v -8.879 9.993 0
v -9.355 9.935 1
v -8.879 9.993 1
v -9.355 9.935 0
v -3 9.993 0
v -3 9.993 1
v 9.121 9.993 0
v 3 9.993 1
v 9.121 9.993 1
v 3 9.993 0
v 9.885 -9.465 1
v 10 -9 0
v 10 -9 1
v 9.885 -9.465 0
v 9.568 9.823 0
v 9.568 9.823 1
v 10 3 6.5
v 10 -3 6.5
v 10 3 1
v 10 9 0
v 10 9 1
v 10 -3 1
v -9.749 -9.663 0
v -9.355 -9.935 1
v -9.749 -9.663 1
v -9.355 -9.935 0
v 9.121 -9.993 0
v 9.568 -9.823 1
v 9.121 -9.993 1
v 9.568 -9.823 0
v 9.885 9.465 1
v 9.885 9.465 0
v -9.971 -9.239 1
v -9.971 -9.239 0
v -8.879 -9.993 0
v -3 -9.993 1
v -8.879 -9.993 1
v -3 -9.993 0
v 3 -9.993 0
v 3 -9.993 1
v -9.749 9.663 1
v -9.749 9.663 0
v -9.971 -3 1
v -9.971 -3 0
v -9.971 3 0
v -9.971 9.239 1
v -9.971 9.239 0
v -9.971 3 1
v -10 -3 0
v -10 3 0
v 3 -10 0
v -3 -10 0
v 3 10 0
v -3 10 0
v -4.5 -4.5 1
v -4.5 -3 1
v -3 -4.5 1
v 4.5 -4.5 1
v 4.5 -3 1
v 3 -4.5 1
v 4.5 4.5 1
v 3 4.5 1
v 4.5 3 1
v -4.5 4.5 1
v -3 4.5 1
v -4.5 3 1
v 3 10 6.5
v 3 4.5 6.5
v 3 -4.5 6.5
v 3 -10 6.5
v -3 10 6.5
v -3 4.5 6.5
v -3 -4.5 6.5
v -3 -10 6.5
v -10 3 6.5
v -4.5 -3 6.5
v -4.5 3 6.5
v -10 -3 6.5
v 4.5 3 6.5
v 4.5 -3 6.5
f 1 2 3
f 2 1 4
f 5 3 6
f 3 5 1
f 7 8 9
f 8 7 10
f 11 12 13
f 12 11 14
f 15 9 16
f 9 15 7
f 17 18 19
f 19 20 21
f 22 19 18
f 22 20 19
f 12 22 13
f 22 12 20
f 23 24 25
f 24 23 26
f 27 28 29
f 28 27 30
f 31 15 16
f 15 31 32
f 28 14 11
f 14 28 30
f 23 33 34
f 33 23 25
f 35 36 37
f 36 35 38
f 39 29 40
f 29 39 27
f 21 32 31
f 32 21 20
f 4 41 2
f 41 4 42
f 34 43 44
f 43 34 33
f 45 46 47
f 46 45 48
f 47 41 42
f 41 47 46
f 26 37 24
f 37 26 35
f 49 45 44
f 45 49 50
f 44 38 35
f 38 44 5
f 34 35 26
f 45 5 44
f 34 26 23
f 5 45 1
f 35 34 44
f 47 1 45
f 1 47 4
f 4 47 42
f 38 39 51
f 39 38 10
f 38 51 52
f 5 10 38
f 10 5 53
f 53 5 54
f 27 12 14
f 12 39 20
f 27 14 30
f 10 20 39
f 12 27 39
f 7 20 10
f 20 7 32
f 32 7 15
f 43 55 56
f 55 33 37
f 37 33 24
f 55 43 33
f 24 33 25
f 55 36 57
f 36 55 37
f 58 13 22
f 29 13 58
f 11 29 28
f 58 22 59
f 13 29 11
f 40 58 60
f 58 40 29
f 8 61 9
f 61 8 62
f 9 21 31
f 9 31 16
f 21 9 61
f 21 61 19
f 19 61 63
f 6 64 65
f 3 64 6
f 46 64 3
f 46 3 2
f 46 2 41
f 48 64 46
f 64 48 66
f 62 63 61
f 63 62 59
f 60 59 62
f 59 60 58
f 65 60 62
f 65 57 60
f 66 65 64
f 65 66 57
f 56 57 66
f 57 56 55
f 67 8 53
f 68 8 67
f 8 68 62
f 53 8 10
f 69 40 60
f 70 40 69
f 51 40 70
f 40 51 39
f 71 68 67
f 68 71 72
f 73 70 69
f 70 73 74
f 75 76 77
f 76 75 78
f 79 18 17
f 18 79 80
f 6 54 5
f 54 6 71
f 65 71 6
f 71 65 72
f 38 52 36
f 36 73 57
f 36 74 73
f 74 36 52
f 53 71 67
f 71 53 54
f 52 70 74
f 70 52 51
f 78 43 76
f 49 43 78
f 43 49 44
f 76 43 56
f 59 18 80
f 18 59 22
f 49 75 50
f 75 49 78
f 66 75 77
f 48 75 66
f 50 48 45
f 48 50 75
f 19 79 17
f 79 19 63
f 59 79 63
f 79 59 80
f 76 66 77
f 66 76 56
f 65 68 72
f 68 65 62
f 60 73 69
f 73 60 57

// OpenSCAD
// file: functions.scad
/*******************************************************************

This OpenSCAD code and its rendered 3D model are part of the

	Kühling&Kühling RepRap Industrial 3D Printer


All details, BOM, assembling instructions and latest sources:
	http://kuehlingkuehling.de

Designed and developed by:
	Jonas Kühling <mail@jonaskuehling.de>
	Simon Kühling <mail@simonkuehling.de>

Licensed under:
	Creative Commons Attribution-ShareAlike
	CC BY-SA 3.0
	http://creativecommons.org/licenses/by-sa/3.0/

*******************************************************************/

module teardrop (r=4.5,h=20,alpha=45,teardropcorner=0,fulldrop=0){		// tear drop hole for top-centering
											// use teardropcorner=1 for bottom horizontal corners
	render()
	translate([-h/2,0,0])
		rotate([-270,0+(teardropcorner*180),90])
			difference(){
				linear_extrude(height=h){
					circle(r);
					polygon(points=[[0,0],[r*cos(alpha),r*sin(alpha)],[0,r/sin(alpha)],[-r*cos(alpha),r*sin(alpha)]], paths=[[0,1,2,3]]);
				}
				if(fulldrop==0) 
					translate([0,(r/sin(alpha))/2+r,h/2]) cube([2*r+2,r/sin(alpha),h+2],center=true);
			}
}

//teardrop(4.5,22,fulldrop=true);



module teardropcentering (r=4.5,h=20,alpha=45){				// tear drop hole for top-centering
	centering_offset_factor = 1.1;
	render()
	translate([-h/2,0,0])
		rotate([-270,0,90])
			difference(){
				linear_extrude(height=h){
					circle(r, $fn=24);
					polygon(points=[[0,0],[r*cos(alpha),r*sin(alpha)],[0,r/sin(alpha)],[-r*cos(alpha),r*sin(alpha)]], paths=[[0,1,2,3]]);
				}
				translate([0,(r/sin(alpha))/2+r*centering_offset_factor,h/2]) cube([2*r+2,r/sin(alpha),h+2],center=true);
			}
}

//teardropcentering();



module teardropcentering_half (r=4.5,h=20, bottom=0,alpha=45){				// tear drop hole for top-centering
																// upper half (bottom=0) or bottom half (bottom=1)
	centering_offset_factor = 1.2;
	render()
	translate([-h/2,0,0])
		rotate([-270,0,90])
			difference(){
				linear_extrude(height=h){
					circle(r, $fn=24);
					polygon(points=[[0,0],[r*cos(alpha),r*sin(alpha)],[0,r/sin(alpha)],[-r*cos(alpha),r*sin(alpha)]], paths=[[0,1,2,3]]);
				}
				translate([0,(r/sin(alpha))/2+r*centering_offset_factor,h/2]) cube([2*r+2,r/sin(alpha),h+2],center=true);
				translate([0,-(r*centering_offset_factor)/2-0.5+bottom*(r*centering_offset_factor+1),h/2]) cube([2*r+2,r*centering_offset_factor+1,h+2],center=true);
			}
}

//teardropcentering_half(bottom=0);


module polyhole(d,h){
	n = max(round(2 * d),3);
	cylinder(h = h, r = (d / 2) / cos (180 / n), $fn = n, center=true);
}



module roundcorner(radius,edge_length){
	render()
	translate([0,0,-1])
		difference(){
			translate([-1,-1,0])
				cube(size = [radius+1,radius+1,edge_length+2], center = false);
			translate(v = [radius,radius,-1])
				cylinder(h = edge_length+4, r=radius, center=false,$fs=0.1);
		}
}

//roundcorner(5,5);



module roundcorner_tear(radius,edge_length){
	render()
	difference(){
		translate([-1,-1,-1])
			cube(size = [edge_length+2, radius+1, radius+1], center = false);
		translate([(edge_length+4)/2-2, radius, radius])
			teardrop(radius, edge_length+4,teardropcorner=1);
	}
}

//roundcorner_tear(8,20);


module roundedge_tear(radius){
	render()
	difference(){
		translate([-1,-1,-1])
			cube(size = [radius+1, radius+1, radius+1], center = false);
		translate([radius,radius,radius])
			union(){
				sphere(r=radius, $fs=0.1);
				translate([0,0,-radius])
					cylinder(r1=(radius*sin(45))-(radius-(radius*sin(45))),r2=radius*sin(45),h=(radius-(radius*sin(45))), $fs=0.1);
			}
	}
}

//roundedge_tear(20);



module roundedge(radius){
	render()
	difference(){
		translate([-1,-1,-1])
			cube(size = [radius+1, radius+1, radius+1], center = false);
		translate([radius,radius,radius])
			sphere(r=radius, $fs=0.1);
	}
}

//roundedge(5);


module nut_trap(nut_wrench_size,trap_height,vertical=0, clearance=0.2,center=true){		// M3 wrench size = 5.5
	radius = cornerdiameter(nut_wrench_size+2*clearance) /2;
	rotate([0,vertical*90,0])
		cylinder(h = trap_height, r = radius, center=center, $fn = 6);
}

//nut_trap(5,5,0);

module nut_slot(nut_wrench_size,nut_height, nut_elevation,vertical=0, clearance=0.2){		// M3 wrench size = 5.5
	radius = cornerdiameter(nut_wrench_size+2*clearance) /2;
	slot_height = nut_height+2*clearance;
	slot_width = nut_wrench_size+2*clearance;
	rotate([0,vertical*270,0]){
		cylinder(h = slot_height, r = radius, center=true, $fn = 6);
		translate([0,-slot_width/2,-slot_height/2]) cube([nut_elevation+1,slot_width,slot_height]);
	}
}

//nut_slot(5.5,3,4,1);

function cornerdiameter(wrench_size) =  2* ((wrench_size)/2)/ cos(180/6);
function cornerdiameter_8(wrench_size) =  2* ((wrench_size)/2)/ cos(180/8);
// main file
/*******************************************************************

This OpenSCAD code and its rendered 3D model are part of the

	Kühling&Kühling RepRap Industrial 3D Printer


All details, BOM, assembling instructions and latest sources:
	http://kuehlingkuehling.de

Designed and developed by:
	Jonas Kühling <mail@jonaskuehling.de>
	Simon Kühling <mail@simonkuehling.de>

Licensed under:
	Creative Commons Attribution-ShareAlike
	CC BY-SA 3.0
	http://creativecommons.org/licenses/by-sa/3.0/

*******************************************************************/

include <configuration.scad>


endcap();


module endcap(){
	difference(){
		// main body
		union(){
			hull(){
				translate([frame_width/2-wall_thin,frame_width/2-wall_thin,0])
					cylinder(r=wall_thin,h=wall_thin);
				translate([-(frame_width/2-wall_thin),(frame_width/2-wall_thin),0])
					cylinder(r=wall_thin,h=wall_thin);
				translate([(frame_width/2-wall_thin),-(frame_width/2-wall_thin),0])
					cylinder(r=wall_thin,h=wall_thin);
				translate([-(frame_width/2-wall_thin),-(frame_width/2-wall_thin),0])
					cylinder(r=wall_thin,h=wall_thin);
			}
			translate([-frame_groove_width/2,-frame_width/2,0])
				cube([frame_groove_width,frame_width,wall_thin+frame_groove_depth]);
			rotate([0,0,90])
				translate([-frame_groove_width/2,-frame_width/2,0])
					cube([frame_groove_width,frame_width,wall_thin+frame_groove_depth]);
		}

		translate([-(frame_width-2*frame_groove_depth)/2,-(frame_width-2*frame_groove_depth)/2,wall_thin])
			cube([frame_width-2*frame_groove_depth,frame_width-2*frame_groove_depth,frame_groove_depth+1]);
	}
}
